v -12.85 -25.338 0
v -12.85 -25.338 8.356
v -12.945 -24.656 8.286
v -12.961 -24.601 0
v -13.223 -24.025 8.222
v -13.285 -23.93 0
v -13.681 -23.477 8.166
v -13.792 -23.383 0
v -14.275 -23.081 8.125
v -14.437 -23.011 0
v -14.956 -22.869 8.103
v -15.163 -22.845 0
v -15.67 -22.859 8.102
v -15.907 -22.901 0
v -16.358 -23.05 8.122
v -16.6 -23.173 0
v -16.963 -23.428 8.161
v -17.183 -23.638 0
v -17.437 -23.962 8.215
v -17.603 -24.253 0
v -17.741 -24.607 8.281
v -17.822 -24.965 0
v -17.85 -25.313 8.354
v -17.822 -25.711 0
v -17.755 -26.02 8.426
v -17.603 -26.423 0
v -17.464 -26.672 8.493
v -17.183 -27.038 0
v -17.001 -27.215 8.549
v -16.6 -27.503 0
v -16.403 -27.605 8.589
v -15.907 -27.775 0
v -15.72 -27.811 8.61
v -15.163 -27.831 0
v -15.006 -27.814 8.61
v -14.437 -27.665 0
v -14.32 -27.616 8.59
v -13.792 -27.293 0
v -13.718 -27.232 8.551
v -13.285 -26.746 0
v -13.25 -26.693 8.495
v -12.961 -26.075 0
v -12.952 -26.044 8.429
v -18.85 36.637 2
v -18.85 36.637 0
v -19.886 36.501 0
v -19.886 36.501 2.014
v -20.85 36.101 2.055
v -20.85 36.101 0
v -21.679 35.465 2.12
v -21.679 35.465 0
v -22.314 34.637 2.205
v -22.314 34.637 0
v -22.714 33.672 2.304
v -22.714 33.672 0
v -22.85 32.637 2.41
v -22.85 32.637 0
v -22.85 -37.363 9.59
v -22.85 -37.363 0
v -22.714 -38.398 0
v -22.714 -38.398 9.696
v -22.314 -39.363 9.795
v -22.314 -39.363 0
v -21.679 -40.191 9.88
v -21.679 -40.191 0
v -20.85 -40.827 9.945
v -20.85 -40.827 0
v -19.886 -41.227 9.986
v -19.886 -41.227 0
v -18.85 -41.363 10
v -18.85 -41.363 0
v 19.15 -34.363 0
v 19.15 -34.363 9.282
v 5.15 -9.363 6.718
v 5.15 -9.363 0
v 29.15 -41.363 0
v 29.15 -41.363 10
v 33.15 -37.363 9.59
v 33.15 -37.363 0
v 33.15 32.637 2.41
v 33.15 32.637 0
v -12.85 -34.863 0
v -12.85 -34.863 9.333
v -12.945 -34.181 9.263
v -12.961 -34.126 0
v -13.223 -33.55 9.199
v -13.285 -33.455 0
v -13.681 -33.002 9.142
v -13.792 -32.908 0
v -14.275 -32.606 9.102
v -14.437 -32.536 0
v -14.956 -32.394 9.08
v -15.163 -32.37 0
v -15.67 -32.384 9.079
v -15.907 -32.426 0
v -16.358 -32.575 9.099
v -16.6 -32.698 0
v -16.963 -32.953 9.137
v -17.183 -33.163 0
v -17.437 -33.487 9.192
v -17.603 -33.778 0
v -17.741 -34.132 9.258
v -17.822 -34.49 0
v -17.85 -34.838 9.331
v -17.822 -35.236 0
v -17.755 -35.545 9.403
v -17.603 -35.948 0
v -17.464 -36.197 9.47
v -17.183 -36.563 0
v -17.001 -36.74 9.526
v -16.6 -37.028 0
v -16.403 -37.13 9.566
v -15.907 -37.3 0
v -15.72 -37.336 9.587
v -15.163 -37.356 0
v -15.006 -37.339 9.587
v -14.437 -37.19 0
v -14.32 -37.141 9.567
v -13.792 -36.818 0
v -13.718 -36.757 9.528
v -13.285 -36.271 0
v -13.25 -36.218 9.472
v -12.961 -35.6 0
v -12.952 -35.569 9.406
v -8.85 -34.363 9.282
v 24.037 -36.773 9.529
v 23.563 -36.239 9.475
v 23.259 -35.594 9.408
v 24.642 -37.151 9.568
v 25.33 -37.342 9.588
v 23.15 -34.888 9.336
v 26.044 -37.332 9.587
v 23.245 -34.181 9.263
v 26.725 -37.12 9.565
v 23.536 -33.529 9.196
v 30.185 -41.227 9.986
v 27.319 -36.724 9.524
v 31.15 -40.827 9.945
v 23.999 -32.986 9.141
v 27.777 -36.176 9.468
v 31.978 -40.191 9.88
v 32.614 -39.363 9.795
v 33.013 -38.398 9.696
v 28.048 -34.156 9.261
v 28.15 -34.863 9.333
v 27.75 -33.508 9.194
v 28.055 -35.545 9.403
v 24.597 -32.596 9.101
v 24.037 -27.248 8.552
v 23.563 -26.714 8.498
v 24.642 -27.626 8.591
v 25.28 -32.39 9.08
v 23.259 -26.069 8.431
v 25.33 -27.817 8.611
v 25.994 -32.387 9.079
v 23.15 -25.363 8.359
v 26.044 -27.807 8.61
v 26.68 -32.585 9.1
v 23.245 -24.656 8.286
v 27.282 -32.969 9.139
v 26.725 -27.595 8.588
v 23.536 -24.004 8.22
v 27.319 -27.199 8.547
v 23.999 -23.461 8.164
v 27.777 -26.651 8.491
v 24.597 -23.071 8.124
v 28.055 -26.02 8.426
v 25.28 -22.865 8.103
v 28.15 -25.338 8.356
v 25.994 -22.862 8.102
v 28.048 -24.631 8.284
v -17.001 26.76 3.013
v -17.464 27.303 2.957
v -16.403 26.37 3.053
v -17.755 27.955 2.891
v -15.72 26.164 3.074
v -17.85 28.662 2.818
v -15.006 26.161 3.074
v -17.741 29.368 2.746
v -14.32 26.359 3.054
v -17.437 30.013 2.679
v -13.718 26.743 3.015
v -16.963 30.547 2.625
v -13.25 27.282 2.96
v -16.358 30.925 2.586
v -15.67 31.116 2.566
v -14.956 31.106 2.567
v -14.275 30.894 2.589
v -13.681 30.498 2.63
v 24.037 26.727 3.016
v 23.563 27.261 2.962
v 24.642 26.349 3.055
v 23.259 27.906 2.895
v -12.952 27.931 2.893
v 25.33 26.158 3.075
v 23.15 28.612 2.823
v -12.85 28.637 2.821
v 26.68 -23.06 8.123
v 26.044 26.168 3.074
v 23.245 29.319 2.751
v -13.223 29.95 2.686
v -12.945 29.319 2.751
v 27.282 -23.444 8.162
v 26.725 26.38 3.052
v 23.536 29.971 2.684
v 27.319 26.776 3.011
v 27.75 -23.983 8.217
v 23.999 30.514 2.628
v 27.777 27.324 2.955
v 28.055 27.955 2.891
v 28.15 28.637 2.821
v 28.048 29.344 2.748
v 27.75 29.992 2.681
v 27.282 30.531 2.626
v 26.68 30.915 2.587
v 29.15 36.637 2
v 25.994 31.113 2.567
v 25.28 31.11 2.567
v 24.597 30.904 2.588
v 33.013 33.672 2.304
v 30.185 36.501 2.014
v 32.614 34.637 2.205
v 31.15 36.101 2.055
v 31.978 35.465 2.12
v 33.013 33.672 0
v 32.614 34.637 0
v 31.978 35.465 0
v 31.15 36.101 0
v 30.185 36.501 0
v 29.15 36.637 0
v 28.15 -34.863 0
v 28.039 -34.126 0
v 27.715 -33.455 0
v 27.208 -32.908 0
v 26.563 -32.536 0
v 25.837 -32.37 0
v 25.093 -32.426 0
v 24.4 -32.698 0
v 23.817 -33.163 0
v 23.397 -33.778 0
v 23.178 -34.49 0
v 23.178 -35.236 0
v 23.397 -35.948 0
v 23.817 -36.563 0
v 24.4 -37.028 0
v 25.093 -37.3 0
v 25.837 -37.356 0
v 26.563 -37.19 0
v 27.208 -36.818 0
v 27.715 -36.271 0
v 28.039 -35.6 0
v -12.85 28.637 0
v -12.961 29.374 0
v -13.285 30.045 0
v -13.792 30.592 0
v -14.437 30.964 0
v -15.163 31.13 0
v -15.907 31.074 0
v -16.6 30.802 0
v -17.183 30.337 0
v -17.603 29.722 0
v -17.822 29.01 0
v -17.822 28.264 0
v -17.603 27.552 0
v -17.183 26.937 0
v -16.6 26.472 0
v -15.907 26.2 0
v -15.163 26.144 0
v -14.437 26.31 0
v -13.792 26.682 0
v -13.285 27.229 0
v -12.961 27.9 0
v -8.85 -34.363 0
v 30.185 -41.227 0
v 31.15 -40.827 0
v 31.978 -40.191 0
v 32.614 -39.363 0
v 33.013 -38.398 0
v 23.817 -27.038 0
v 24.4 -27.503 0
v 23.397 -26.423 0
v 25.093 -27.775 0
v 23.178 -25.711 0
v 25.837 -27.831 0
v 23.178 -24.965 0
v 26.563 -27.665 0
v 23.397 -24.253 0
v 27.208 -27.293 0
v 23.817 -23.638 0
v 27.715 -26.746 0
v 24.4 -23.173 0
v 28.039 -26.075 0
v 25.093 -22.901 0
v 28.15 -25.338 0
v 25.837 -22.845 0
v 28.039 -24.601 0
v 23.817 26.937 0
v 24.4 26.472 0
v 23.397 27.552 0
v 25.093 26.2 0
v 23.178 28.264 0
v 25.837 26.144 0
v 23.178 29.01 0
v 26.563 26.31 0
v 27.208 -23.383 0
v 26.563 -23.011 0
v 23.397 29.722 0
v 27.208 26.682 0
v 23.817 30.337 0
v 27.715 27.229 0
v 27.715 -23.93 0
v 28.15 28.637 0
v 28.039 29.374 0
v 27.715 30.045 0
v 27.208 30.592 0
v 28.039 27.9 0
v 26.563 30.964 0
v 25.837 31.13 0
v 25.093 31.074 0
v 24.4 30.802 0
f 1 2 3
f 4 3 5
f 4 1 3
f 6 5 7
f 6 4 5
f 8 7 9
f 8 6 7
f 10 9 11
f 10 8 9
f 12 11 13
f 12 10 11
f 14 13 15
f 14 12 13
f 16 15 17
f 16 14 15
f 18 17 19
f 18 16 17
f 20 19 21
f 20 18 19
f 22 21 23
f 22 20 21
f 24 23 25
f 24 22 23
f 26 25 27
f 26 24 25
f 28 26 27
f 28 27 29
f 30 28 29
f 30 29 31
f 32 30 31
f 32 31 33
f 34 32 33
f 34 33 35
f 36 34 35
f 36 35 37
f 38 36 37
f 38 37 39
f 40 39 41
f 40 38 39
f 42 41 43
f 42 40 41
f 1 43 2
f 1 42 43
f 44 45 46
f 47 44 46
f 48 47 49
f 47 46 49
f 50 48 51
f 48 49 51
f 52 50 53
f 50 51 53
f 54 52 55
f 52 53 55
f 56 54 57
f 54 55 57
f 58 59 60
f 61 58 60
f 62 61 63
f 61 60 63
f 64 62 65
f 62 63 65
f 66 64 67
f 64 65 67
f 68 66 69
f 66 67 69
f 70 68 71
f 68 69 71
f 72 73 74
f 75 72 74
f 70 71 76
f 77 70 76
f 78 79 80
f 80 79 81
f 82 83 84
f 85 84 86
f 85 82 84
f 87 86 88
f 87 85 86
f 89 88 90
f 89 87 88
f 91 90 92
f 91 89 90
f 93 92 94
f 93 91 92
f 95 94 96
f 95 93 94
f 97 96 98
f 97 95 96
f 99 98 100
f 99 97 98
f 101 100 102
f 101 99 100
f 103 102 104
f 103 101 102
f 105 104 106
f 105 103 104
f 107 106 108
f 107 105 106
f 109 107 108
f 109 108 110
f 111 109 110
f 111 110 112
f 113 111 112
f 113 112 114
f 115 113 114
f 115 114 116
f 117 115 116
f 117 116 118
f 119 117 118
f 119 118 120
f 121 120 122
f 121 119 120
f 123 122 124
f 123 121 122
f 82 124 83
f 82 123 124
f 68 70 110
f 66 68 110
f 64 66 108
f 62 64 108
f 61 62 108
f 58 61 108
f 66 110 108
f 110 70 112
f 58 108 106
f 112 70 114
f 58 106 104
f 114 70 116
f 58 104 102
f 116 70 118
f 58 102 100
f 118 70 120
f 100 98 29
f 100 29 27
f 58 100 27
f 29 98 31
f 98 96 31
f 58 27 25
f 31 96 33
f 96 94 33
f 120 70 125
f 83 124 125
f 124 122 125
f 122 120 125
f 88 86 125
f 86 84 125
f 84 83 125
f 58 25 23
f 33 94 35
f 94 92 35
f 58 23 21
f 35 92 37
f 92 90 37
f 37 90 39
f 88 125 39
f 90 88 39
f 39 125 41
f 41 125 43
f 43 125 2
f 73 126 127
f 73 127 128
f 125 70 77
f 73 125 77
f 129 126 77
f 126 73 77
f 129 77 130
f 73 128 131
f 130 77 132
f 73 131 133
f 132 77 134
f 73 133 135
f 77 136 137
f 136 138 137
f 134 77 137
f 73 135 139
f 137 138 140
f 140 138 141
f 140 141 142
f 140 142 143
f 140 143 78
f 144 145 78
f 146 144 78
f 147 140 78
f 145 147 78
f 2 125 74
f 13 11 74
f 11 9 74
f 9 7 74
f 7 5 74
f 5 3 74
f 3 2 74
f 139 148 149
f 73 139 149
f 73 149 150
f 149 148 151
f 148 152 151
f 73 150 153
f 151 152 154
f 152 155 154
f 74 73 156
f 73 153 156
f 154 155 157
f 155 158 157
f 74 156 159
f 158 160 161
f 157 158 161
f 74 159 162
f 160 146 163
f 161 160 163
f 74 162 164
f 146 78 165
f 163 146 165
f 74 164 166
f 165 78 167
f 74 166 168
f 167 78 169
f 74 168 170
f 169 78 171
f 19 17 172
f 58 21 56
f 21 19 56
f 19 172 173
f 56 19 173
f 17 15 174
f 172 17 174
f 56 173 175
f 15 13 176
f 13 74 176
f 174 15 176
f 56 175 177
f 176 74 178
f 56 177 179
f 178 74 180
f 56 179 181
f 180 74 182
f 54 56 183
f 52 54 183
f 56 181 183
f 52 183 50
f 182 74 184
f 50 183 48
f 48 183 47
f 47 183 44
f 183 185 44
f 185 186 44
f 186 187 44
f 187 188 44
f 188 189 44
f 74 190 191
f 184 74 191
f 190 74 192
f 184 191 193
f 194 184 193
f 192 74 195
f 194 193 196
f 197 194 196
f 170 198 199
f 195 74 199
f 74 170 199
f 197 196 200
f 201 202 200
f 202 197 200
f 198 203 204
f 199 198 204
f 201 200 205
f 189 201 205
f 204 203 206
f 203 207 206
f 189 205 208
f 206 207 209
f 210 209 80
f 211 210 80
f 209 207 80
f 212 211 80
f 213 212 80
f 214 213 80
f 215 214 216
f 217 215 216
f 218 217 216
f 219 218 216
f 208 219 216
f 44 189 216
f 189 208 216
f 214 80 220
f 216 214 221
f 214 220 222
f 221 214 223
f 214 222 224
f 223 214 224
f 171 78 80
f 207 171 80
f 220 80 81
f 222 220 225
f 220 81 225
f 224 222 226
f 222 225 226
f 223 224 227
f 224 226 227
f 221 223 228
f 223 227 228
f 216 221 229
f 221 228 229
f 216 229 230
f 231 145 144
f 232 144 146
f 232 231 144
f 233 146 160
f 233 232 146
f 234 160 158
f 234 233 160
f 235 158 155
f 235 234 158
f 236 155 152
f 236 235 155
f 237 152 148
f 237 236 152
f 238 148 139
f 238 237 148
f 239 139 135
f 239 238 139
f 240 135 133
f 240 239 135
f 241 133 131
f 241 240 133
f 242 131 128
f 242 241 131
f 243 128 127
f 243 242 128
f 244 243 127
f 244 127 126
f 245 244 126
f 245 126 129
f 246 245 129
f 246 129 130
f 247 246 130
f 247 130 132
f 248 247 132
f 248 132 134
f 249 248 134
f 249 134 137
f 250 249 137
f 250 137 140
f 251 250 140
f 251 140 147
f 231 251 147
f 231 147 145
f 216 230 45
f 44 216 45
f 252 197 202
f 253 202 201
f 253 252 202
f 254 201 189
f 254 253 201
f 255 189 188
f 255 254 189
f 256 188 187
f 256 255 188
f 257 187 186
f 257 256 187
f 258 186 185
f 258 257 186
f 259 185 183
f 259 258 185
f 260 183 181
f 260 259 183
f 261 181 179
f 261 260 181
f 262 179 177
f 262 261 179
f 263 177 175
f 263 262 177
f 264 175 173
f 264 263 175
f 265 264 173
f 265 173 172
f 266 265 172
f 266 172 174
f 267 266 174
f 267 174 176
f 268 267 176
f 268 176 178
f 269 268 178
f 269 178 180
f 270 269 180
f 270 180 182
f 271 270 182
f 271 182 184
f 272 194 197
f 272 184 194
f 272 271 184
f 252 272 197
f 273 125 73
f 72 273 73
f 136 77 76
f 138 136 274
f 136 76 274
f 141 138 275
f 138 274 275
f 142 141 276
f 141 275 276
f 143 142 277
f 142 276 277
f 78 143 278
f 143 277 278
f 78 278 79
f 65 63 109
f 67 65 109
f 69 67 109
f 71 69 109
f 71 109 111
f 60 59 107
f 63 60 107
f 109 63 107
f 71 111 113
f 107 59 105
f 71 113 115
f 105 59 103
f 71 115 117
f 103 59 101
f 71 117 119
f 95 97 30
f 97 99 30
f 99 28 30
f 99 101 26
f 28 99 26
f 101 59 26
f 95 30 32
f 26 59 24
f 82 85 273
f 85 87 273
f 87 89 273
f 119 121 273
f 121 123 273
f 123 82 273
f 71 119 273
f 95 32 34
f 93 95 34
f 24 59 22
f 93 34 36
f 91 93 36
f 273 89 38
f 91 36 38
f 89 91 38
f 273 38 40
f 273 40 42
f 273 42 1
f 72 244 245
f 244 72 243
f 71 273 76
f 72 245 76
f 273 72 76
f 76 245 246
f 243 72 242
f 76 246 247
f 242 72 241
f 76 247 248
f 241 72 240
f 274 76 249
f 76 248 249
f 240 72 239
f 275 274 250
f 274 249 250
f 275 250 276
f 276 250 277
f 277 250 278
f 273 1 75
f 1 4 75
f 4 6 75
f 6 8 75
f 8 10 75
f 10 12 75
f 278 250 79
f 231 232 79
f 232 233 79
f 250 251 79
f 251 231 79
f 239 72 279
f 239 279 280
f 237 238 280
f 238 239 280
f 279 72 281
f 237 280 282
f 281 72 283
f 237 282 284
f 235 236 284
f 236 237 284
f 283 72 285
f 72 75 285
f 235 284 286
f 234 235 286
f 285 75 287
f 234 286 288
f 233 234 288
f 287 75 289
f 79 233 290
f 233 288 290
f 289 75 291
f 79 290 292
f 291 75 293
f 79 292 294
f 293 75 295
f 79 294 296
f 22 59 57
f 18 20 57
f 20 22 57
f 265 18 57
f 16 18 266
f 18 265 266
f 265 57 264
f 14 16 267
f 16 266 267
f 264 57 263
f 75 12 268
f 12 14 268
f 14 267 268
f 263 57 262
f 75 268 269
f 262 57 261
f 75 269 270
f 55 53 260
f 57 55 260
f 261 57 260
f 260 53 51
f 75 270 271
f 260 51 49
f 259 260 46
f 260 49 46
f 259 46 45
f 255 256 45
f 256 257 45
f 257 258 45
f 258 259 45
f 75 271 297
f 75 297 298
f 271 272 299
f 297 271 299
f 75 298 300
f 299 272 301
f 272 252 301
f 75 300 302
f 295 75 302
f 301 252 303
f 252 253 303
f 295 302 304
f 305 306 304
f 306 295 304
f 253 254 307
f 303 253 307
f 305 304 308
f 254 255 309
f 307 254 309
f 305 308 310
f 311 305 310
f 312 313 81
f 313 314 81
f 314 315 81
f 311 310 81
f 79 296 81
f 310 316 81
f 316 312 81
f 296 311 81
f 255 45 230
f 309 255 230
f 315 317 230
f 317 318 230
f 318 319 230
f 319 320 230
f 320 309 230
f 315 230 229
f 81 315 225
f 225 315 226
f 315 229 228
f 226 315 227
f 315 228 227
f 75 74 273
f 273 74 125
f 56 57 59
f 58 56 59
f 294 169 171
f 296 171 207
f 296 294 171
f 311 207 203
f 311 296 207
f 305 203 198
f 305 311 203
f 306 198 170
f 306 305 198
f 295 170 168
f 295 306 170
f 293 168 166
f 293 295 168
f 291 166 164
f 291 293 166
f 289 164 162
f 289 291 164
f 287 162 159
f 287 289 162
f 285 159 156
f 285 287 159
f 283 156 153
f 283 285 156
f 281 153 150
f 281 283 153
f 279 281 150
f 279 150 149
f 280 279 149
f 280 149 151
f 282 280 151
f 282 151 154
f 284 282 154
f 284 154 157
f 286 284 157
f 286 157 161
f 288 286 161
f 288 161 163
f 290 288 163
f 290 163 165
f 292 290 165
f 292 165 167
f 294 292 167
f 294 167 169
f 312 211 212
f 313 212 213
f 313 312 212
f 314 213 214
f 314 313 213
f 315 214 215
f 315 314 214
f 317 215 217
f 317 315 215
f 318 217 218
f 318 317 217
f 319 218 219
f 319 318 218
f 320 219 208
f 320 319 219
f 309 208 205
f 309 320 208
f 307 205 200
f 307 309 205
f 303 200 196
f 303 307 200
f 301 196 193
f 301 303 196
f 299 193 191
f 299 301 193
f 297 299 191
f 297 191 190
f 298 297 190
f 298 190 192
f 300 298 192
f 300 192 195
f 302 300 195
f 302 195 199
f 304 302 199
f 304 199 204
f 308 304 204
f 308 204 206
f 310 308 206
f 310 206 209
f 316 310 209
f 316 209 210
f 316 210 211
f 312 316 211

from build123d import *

# Parameters (mm, degrees)
F0_R          = 2.5
F1_DEPTH      = 20
F3_DEPTH      = 25
F5_DEPTH      = 33.15069
F5_DEPTH_BACK = 22.85131


with BuildPart() as f1:
    # F0 (on Top) → F1 (new body)
    with BuildSketch(Plane.XY):
        with BuildLine():
            Line((29.14969, 36.637019), (-18.85031, 36.637019))
            ThreePointArc((-18.85031, 36.637019), (-21.678737, 35.465446), (-22.85031, 32.637019))
            Line((-22.85031, 32.637019), (-22.85031, -37.362981))
            ThreePointArc((-22.85031, -37.362981), (-21.678737, -40.191408), (-18.85031, -41.362981))
            Line((-18.85031, -41.362981), (29.14969, -41.362981))
            ThreePointArc((29.14969, -41.362981), (31.978117, -40.191408), (33.14969, -37.362981))
            Line((33.14969, -37.362981), (33.14969, 32.637019))
            ThreePointArc((33.14969, 32.637019), (31.978117, 35.465446), (29.14969, 36.637019))
        make_face()
        with Locations((-15.35031, -34.862981)):
            Circle(F0_R, mode=Mode.SUBTRACT)
        with Locations((-15.35031, -25.337981)):
            Circle(F0_R, mode=Mode.SUBTRACT)
        with Locations((25.64969, -34.862981)):
            Circle(F0_R, mode=Mode.SUBTRACT)
        with Locations((25.64969, -25.337981)):
            Circle(F0_R, mode=Mode.SUBTRACT)
        with Locations((-15.35031, 28.637019)):
            Circle(F0_R, mode=Mode.SUBTRACT)
        with Locations((25.64969, 28.637019)):
            Circle(F0_R, mode=Mode.SUBTRACT)
    extrude(amount=F1_DEPTH)

    # F2 (on face) → F3 (cut)
    with BuildSketch(Plane.XY.offset(20)):
        Polygon((5.14969, -9.362981), (-8.85031, -34.362981), (19.14969, -34.362981), align=None)
    extrude(amount=-F3_DEPTH, mode=Mode.SUBTRACT)

    # F4 (on Right) → F5 (cut, two sides)
    with BuildSketch(Plane.YZ) as f5_sk:
        Polygon((36.637019, 2), (36.637019, 20), (-41.362981, 20), (-41.362981, 10), align=None)
    extrude(amount=F5_DEPTH, mode=Mode.SUBTRACT)
    extrude(f5_sk.sketch, amount=-F5_DEPTH_BACK, mode=Mode.SUBTRACT)


solid = f1.part
